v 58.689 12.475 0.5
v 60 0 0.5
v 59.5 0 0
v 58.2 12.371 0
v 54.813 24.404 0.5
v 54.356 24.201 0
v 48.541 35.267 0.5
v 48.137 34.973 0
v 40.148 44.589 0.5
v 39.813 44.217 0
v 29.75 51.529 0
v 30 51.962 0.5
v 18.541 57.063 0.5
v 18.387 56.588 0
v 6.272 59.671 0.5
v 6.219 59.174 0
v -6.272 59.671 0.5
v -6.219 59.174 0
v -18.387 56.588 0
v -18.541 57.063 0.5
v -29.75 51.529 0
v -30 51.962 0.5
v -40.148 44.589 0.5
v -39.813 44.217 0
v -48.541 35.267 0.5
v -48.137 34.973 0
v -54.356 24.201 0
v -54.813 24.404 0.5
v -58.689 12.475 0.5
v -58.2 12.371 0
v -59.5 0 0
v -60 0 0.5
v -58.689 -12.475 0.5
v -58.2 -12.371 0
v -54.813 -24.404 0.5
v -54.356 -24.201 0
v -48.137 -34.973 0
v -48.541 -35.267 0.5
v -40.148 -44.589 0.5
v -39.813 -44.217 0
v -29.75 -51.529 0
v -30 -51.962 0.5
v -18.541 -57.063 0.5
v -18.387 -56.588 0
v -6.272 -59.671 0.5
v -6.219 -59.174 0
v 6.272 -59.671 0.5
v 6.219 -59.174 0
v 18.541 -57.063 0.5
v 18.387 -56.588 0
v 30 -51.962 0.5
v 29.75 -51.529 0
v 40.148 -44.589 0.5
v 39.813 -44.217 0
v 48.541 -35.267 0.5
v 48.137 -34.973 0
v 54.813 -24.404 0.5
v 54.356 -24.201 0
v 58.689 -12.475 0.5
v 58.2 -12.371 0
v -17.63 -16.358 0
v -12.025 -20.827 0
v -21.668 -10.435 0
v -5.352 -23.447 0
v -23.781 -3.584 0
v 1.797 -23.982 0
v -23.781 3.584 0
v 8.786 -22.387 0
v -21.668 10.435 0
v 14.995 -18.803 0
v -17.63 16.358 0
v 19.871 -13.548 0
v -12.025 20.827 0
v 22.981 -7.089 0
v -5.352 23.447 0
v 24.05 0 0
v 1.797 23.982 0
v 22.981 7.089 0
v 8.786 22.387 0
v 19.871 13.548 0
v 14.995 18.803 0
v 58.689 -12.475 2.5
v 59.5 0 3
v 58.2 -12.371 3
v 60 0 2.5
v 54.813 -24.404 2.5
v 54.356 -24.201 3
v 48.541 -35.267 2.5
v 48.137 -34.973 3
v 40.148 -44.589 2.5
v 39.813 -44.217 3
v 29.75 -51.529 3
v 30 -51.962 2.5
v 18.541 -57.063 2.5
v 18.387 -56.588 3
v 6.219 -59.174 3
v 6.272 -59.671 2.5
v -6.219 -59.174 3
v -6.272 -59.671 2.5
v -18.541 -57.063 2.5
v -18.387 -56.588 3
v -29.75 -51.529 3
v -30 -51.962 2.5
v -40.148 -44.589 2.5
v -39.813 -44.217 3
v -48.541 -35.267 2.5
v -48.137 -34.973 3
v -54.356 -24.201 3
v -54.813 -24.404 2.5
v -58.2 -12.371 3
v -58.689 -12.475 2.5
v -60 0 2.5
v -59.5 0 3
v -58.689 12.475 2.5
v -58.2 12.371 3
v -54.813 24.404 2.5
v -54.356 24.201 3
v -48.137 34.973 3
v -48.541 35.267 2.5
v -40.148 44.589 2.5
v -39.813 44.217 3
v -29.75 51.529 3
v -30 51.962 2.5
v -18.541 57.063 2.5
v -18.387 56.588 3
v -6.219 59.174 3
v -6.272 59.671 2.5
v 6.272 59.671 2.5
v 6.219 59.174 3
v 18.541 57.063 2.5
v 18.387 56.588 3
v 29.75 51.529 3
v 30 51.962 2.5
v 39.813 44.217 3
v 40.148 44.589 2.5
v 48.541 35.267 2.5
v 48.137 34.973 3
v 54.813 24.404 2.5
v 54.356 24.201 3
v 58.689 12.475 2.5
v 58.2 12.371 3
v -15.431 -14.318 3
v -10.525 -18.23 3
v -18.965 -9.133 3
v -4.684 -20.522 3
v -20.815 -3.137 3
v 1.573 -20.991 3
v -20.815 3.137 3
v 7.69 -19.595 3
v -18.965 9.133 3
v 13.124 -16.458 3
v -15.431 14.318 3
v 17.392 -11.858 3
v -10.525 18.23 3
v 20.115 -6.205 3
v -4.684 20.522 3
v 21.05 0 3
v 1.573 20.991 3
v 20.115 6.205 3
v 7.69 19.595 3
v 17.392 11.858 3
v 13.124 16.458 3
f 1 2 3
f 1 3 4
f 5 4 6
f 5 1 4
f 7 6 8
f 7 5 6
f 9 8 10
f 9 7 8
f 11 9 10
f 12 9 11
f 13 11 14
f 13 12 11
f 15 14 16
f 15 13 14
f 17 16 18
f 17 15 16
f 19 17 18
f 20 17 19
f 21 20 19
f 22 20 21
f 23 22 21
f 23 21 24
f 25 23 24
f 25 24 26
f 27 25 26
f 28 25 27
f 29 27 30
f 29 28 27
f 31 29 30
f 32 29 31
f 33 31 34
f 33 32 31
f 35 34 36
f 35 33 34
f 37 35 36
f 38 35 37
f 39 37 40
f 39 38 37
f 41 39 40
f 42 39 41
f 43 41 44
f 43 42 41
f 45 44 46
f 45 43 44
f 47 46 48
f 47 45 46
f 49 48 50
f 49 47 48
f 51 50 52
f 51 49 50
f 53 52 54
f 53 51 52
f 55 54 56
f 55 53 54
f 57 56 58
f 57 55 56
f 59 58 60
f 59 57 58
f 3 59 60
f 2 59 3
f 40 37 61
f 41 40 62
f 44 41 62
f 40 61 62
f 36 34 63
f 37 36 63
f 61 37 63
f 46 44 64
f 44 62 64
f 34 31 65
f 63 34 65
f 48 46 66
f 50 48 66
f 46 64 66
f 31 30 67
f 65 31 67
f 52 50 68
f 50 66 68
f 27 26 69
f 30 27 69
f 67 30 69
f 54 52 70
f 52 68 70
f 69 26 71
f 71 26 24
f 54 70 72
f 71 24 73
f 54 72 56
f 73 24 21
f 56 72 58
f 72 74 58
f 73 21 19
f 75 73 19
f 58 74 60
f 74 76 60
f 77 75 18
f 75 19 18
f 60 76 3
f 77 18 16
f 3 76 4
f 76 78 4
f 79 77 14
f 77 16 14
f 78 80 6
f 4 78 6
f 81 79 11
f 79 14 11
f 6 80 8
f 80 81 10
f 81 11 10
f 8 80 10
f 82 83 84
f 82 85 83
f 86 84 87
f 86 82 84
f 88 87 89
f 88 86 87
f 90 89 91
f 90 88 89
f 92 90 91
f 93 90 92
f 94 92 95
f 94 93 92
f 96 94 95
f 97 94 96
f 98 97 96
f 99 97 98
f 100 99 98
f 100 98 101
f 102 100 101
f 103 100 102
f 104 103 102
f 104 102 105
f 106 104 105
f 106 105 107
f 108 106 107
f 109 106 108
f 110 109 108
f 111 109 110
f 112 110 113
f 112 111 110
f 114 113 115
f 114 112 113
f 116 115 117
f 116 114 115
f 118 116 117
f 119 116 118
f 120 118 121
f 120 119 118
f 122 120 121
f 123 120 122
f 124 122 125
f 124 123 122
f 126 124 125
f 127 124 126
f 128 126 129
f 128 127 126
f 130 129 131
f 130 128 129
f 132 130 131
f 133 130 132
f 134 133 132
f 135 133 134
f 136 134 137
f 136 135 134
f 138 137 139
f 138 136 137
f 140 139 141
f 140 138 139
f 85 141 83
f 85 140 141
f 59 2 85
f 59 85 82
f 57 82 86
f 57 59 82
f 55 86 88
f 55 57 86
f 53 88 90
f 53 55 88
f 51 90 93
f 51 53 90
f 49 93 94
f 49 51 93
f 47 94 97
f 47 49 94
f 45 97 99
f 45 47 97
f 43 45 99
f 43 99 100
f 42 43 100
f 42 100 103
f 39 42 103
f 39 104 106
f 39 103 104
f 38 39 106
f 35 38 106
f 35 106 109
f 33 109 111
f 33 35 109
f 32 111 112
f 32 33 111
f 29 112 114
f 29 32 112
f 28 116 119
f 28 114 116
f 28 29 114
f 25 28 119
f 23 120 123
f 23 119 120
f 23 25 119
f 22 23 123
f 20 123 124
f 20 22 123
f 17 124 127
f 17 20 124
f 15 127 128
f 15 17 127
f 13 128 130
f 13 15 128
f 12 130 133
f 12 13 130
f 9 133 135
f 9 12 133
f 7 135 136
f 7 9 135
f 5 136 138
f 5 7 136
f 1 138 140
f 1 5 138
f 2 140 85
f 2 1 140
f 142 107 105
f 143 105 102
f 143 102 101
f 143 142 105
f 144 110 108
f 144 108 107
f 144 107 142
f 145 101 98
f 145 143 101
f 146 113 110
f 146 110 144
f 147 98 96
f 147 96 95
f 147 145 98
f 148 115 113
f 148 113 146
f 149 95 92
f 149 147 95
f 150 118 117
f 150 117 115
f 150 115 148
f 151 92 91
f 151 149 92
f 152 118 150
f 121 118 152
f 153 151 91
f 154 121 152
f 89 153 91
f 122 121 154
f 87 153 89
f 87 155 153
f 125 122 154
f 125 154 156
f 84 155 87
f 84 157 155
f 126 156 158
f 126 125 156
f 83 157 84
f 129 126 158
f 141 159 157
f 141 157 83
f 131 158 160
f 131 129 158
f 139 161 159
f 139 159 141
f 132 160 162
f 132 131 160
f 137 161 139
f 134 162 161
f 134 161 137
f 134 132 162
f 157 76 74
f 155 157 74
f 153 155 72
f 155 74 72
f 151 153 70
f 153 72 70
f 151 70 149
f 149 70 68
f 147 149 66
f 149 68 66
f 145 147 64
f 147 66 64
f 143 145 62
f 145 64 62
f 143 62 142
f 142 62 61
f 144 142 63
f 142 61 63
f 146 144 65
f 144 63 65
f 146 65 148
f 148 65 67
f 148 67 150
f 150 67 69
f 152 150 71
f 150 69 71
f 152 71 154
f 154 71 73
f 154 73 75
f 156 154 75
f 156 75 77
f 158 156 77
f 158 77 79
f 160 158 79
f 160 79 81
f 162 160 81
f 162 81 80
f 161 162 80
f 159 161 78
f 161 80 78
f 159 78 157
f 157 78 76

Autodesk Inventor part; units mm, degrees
ref_plane "YZ Plane" through (0, 0, 0) normal (1, 0, 0) x (0, 1, 0)
ref_plane "XZ Plane" through (0, 0, 0) normal (0, 1, 0) x (-1, 0, 0)
ref_plane "XY Plane" through (0, 0, 0) normal (0, 0, 1) x (1, 0, 0)
sketch "Sketch1" plane through (0, 0, 0) normal (0, 0, 1) x (1, 0, 0)
  circle A0 centre (0, 0) radius 60
  dimension "d0" = 120
extrude "Extrusion1" add sketch "Sketch1" along normal blind 3
chamfer "Chamfer2" distance 0.5 angle 45 2 edges at (-60, 0, 3) (-60, 0, 0)
sketch "Sketch5" plane through (0, 0, 3) normal (0, 0, 1) x (1, 0, 0)
  circle A0 centre (0, 0) radius 21.05
  dimension "d36" = 42.1
extrude "Extrusion5" cut sketch "Sketch5" against normal through all
chamfer "Chamfer3" distance 3 angle 45 1 edges at (-21.05, 0, 0)
properties part number "spool_side"
